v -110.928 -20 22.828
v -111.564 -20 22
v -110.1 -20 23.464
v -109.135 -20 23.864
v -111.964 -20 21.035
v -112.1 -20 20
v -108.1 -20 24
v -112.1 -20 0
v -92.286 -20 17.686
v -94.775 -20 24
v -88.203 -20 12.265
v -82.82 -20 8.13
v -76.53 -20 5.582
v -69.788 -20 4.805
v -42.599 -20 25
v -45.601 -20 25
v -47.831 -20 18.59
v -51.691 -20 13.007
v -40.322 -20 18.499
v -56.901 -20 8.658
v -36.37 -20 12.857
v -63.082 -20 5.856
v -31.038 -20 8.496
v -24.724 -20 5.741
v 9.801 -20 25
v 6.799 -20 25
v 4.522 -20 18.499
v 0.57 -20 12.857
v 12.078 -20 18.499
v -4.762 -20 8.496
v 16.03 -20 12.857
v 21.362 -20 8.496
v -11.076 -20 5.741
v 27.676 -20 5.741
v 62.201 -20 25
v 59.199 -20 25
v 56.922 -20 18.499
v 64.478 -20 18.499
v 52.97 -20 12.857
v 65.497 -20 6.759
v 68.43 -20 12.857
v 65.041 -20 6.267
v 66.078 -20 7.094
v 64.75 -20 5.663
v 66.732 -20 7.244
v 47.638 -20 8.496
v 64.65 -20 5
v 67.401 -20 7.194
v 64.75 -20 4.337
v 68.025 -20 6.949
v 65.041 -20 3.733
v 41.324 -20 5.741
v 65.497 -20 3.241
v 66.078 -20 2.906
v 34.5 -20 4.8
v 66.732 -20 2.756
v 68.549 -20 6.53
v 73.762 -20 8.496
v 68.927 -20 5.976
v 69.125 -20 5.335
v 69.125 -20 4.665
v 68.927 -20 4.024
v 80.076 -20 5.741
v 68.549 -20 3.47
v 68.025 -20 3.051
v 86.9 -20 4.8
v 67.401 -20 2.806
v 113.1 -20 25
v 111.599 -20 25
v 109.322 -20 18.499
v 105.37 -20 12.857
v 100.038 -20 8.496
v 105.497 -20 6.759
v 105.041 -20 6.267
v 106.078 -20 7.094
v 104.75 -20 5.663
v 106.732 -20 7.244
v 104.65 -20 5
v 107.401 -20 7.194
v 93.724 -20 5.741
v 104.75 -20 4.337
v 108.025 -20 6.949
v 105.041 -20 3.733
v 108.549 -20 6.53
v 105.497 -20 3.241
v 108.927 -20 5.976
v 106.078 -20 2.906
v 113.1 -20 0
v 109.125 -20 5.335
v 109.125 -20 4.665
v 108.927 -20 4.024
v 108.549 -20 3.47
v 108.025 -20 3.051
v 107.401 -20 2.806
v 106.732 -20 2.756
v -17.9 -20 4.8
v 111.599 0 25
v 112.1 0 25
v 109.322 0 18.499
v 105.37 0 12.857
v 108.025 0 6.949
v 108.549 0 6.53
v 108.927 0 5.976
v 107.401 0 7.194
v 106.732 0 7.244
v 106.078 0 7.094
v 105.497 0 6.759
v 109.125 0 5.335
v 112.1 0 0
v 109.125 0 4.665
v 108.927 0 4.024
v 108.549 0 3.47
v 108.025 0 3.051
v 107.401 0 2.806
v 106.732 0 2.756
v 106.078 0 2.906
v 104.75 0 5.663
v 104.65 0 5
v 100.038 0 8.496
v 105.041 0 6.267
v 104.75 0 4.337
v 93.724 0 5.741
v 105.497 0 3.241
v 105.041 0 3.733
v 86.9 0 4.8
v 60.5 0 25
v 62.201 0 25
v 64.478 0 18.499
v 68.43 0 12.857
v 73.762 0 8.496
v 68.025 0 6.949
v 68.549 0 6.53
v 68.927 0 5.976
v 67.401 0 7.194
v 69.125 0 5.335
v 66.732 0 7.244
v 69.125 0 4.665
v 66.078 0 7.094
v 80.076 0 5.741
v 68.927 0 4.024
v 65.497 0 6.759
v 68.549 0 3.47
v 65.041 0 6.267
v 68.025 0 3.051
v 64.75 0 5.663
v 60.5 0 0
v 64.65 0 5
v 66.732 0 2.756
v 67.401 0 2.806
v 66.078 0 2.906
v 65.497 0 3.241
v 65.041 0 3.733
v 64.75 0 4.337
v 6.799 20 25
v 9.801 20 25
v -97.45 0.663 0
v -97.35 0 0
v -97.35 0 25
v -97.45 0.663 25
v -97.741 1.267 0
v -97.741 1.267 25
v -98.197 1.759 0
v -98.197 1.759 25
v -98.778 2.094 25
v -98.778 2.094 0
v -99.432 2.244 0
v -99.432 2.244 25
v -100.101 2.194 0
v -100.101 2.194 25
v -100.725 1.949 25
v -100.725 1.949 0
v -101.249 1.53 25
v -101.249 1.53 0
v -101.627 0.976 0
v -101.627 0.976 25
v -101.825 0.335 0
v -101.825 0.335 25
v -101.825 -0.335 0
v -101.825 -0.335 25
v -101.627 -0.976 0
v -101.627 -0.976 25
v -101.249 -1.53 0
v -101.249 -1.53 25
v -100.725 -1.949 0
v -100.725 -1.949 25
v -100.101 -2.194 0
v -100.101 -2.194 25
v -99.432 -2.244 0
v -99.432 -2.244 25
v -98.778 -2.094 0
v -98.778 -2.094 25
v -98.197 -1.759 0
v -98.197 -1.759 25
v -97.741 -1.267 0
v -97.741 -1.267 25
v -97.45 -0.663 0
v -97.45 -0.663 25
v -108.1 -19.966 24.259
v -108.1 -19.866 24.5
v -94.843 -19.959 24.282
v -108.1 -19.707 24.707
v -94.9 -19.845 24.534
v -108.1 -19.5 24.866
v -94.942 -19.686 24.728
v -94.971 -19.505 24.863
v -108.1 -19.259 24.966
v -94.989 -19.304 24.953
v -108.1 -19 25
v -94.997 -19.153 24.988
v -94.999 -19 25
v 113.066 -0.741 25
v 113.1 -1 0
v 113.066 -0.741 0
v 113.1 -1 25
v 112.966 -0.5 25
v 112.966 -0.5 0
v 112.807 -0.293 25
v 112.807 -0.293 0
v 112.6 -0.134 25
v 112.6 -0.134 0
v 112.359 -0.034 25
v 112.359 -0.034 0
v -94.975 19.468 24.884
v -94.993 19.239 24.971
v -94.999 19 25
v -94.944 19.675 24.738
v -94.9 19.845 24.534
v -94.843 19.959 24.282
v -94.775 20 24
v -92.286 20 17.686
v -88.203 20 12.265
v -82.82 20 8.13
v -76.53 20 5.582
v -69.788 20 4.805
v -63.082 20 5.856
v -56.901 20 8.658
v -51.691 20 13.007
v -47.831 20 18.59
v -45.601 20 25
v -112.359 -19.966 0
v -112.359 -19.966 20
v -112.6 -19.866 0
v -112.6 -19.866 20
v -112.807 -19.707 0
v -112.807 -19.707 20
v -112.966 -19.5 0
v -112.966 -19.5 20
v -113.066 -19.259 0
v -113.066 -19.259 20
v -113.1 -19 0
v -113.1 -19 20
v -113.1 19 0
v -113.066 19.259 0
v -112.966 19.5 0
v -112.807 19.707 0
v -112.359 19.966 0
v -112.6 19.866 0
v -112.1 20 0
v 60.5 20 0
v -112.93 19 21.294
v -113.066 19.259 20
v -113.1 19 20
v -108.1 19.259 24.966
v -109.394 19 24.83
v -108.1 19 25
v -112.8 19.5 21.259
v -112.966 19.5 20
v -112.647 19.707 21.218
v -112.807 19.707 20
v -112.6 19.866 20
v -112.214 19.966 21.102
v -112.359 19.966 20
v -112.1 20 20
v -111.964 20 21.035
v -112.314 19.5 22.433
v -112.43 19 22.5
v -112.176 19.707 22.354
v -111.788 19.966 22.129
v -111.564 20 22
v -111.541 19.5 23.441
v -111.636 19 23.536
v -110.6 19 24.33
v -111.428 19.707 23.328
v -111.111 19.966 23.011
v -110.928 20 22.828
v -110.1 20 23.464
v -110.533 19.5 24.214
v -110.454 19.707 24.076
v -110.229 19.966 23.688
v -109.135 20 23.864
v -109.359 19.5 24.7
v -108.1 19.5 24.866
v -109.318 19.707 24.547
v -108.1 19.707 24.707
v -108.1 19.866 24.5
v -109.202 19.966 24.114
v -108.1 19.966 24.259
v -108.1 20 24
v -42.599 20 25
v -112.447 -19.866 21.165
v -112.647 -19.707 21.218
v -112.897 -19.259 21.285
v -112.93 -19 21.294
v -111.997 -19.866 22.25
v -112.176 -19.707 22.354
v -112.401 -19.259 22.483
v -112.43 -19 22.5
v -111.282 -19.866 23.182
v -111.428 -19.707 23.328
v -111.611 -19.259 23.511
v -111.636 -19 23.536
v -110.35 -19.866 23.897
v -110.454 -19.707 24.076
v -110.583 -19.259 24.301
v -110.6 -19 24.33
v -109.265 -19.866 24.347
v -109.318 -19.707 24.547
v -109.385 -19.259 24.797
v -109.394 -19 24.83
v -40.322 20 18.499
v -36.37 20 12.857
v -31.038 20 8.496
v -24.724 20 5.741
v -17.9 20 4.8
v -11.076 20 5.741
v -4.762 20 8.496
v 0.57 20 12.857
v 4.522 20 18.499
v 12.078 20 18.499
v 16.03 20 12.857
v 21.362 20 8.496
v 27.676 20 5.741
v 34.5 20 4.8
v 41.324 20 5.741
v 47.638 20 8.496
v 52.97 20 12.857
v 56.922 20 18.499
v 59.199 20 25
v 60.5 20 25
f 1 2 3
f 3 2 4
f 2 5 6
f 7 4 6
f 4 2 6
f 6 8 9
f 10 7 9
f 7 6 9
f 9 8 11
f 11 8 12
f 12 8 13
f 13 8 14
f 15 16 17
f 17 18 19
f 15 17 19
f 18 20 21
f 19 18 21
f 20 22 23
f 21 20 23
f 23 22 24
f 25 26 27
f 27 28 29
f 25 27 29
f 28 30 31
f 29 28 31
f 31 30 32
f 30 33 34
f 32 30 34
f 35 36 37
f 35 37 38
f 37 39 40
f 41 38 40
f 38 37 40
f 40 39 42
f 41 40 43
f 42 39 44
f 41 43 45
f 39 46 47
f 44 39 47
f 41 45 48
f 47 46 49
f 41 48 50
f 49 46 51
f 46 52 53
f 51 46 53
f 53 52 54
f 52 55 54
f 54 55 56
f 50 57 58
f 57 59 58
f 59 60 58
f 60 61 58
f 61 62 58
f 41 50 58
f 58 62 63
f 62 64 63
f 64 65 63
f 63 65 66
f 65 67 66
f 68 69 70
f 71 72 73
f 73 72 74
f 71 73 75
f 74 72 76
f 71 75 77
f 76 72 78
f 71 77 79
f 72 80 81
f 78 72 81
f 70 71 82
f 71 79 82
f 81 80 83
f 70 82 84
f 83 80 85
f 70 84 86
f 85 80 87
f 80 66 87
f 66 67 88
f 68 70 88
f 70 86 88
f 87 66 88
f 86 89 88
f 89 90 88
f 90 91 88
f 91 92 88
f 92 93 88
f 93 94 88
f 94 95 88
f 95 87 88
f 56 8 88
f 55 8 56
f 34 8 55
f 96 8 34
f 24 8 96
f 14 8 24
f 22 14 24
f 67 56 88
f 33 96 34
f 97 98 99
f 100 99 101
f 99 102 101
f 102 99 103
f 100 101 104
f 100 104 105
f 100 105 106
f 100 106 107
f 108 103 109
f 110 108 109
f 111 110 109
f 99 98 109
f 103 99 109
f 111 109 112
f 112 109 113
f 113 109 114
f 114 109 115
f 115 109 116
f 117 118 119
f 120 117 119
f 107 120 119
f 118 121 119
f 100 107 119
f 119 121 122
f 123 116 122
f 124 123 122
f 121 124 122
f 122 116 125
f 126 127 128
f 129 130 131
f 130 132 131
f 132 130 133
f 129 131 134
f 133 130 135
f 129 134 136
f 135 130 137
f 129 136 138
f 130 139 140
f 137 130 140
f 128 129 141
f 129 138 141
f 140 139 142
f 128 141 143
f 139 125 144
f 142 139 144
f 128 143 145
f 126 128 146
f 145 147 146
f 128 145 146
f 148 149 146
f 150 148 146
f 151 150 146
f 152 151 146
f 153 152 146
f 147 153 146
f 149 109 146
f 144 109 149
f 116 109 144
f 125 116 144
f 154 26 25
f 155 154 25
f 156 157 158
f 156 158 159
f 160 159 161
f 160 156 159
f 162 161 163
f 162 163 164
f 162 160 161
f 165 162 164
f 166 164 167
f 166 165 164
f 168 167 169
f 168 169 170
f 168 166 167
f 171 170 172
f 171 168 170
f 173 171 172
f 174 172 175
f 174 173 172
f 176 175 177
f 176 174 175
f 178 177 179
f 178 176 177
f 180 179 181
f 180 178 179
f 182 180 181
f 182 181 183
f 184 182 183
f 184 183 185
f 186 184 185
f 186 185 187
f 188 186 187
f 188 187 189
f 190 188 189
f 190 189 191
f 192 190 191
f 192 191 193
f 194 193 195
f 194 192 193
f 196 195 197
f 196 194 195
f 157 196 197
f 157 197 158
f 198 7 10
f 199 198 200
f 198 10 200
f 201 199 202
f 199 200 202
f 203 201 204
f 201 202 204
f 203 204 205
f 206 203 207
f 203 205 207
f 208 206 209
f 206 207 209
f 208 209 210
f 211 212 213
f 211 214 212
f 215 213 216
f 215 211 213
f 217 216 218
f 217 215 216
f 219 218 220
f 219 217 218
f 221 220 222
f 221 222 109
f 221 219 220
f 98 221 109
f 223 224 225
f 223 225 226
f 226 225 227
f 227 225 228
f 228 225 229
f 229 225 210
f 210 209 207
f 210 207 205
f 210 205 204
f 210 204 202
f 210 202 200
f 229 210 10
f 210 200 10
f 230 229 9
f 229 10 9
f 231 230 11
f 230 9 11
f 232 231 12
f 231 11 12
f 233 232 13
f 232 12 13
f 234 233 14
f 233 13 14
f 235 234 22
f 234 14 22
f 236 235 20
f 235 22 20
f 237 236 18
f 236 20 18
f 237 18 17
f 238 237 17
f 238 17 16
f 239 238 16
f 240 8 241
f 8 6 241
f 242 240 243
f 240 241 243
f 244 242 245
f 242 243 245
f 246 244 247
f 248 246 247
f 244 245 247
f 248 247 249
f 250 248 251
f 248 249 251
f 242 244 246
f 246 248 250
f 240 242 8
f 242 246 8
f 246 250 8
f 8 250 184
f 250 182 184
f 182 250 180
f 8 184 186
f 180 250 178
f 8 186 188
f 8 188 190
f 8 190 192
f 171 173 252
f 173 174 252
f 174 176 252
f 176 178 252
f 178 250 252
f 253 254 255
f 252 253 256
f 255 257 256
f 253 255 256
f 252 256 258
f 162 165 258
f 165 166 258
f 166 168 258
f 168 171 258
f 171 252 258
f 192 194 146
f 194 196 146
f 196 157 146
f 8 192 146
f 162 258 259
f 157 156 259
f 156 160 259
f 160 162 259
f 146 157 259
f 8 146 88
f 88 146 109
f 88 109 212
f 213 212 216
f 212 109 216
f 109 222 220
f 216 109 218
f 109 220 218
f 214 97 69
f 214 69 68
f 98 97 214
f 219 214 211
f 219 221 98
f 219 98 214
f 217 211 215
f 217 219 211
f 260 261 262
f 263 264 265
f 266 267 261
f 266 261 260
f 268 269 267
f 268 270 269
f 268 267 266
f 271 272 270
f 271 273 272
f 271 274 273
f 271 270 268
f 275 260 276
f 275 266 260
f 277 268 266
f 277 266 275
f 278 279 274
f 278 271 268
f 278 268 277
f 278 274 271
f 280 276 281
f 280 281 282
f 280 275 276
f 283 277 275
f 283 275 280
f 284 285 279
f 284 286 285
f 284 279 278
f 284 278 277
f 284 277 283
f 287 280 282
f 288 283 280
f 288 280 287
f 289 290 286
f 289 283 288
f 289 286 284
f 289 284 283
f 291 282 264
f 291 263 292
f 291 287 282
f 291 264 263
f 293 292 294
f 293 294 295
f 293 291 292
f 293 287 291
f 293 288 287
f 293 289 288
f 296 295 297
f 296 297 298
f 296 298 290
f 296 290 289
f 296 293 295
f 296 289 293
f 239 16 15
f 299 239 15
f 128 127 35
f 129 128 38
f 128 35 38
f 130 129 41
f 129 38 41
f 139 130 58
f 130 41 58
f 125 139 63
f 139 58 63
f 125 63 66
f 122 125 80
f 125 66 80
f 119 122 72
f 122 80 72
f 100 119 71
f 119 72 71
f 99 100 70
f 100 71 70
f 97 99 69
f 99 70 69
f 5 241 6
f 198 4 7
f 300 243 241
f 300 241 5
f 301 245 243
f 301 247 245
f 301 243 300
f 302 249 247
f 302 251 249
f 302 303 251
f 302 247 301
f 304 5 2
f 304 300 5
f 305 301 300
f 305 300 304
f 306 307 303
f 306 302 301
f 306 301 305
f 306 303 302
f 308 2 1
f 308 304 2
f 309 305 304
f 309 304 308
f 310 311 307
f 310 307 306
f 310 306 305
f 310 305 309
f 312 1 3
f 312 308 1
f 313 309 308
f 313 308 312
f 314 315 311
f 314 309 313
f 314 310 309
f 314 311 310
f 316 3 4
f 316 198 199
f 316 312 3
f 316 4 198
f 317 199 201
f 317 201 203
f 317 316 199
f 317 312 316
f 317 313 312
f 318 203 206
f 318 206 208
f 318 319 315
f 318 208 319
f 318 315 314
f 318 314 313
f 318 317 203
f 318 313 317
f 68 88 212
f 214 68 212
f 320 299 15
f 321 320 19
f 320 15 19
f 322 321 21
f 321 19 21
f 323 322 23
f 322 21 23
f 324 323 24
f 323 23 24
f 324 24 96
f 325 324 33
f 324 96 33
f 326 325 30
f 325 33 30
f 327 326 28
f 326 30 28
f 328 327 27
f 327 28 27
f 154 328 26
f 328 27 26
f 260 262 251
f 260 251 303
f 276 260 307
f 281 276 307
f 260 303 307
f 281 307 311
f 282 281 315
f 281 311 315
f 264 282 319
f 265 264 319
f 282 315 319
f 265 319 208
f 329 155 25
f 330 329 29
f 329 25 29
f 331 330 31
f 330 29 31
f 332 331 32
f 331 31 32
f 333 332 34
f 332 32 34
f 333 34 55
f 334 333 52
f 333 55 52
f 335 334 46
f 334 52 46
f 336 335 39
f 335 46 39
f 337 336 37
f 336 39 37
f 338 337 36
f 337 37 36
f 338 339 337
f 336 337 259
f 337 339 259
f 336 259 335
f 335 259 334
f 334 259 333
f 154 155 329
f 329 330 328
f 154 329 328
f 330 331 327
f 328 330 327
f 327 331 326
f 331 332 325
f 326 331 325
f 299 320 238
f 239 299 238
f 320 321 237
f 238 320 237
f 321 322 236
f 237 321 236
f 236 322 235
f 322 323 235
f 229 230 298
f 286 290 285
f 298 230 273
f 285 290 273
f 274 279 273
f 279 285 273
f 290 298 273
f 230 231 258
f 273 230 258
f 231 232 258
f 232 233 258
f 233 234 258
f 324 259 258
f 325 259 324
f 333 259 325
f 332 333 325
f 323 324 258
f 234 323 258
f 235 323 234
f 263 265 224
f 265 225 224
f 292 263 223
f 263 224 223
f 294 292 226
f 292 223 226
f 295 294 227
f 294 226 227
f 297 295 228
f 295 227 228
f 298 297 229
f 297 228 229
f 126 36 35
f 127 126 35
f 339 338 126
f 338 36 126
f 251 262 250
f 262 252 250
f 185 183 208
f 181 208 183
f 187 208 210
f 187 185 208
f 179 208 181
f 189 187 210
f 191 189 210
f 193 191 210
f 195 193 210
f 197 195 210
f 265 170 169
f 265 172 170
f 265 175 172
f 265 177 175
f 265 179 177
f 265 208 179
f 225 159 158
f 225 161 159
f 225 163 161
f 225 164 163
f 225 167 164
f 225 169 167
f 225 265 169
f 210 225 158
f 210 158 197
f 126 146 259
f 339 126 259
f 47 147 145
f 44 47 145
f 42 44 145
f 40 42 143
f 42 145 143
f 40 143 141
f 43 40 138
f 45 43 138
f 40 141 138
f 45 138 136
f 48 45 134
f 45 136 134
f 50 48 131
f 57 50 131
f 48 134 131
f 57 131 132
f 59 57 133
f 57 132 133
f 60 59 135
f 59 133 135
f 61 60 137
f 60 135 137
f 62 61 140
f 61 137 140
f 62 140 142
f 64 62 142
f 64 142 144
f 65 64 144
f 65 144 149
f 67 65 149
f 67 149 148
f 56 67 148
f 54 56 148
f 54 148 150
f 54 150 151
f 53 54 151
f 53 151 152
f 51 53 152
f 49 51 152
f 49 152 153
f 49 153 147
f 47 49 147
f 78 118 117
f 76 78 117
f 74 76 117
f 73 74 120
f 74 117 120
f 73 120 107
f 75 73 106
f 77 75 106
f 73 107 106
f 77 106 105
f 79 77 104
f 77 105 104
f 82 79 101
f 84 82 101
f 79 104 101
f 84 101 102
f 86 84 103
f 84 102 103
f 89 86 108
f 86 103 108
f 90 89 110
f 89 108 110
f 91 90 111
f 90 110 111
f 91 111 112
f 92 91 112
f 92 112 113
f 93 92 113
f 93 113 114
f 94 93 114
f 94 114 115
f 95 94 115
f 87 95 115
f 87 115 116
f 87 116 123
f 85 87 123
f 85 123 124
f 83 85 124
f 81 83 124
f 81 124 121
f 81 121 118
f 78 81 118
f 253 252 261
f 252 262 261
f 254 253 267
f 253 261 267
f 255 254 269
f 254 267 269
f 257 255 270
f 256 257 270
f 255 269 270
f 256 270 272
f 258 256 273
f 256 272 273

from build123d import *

# Parameters (mm, degrees)
F0_R     = 2.25
F1_DEPTH = 25
F3_DEPTH = 40.001
F4_R     = 2.25
F5_DEPTH = 20.001
F6_R     = 5
F7_R     = 1
F8_R     = 1


with BuildPart() as f1:
    # F0 (on Top) → F1 (new body)
    with BuildSketch(Plane.XY):
        Polygon((-113.1, -20), (113.1, -20), (113.1, 0), (60.5, 0), (60.5, 20), (-113.1, 20), align=None)
        with Locations((-99.6, 0)):
            Circle(F0_R, mode=Mode.SUBTRACT)
    extrude(amount=F1_DEPTH)

    # F2 (on face) → F3 (cut, through all)
    with BuildSketch(Plane.XZ.offset(20)):
        with BuildLine():
            Line((-45.1, 30), (-95.5, 30))
            ThreePointArc((-95.5, 30), (-70.3, 4.8), (-45.1, 30))
        make_face()
        with BuildLine():
            Line((7.3, 30), (-43.1, 30))
            ThreePointArc((-43.1, 30), (-17.9, 4.8), (7.3, 30))
        make_face()
        with BuildLine():
            Line((59.7, 30), (9.3, 30))
            ThreePointArc((9.3, 30), (34.5, 4.8), (59.7, 30))
        make_face()
        with BuildLine():
            Line((112.1, 30), (61.7, 30))
            ThreePointArc((61.7, 30), (86.9, 4.8), (112.1, 30))
        make_face()
    extrude(amount=-F3_DEPTH, mode=Mode.SUBTRACT)

    # F4 (on face) → F5 (cut, through all)
    with BuildSketch(Plane(origin=(0, 0, 0), x_dir=(-1, 0, 0), z_dir=(0, 1, 0))):
        with Locations((-66.9, 5)):
            Circle(F4_R)
        with Locations((-106.9, 5)):
            Circle(F4_R)
    extrude(amount=-F5_DEPTH, mode=Mode.SUBTRACT)

    # F6
    f6_edges = [f1.edges().sort_by_distance(p)[0] for p in [
        (-113.1, 0, 25),
    ]]
    fillet(f6_edges, radius=F6_R)

    # F7
    f7_edges = [f1.edges().sort_by_distance(p)[0] for p in [
        (113.1, 0, 12.5),
    ]]
    fillet(f7_edges, radius=F7_R)

    # F8
    f8_edges = [f1.edges().sort_by_distance(p)[0] for p in [
        (-113.1, 20, 10),
        (-111.635534, 20, 23.535534),
        (-101.549494, 20, 25),
        (-113.1, -20, 10),
        (-111.635534, -20, 23.535534),
        (-101.549494, -20, 25),
    ]]
    fillet(f8_edges, radius=F8_R)


solid = f1.part
